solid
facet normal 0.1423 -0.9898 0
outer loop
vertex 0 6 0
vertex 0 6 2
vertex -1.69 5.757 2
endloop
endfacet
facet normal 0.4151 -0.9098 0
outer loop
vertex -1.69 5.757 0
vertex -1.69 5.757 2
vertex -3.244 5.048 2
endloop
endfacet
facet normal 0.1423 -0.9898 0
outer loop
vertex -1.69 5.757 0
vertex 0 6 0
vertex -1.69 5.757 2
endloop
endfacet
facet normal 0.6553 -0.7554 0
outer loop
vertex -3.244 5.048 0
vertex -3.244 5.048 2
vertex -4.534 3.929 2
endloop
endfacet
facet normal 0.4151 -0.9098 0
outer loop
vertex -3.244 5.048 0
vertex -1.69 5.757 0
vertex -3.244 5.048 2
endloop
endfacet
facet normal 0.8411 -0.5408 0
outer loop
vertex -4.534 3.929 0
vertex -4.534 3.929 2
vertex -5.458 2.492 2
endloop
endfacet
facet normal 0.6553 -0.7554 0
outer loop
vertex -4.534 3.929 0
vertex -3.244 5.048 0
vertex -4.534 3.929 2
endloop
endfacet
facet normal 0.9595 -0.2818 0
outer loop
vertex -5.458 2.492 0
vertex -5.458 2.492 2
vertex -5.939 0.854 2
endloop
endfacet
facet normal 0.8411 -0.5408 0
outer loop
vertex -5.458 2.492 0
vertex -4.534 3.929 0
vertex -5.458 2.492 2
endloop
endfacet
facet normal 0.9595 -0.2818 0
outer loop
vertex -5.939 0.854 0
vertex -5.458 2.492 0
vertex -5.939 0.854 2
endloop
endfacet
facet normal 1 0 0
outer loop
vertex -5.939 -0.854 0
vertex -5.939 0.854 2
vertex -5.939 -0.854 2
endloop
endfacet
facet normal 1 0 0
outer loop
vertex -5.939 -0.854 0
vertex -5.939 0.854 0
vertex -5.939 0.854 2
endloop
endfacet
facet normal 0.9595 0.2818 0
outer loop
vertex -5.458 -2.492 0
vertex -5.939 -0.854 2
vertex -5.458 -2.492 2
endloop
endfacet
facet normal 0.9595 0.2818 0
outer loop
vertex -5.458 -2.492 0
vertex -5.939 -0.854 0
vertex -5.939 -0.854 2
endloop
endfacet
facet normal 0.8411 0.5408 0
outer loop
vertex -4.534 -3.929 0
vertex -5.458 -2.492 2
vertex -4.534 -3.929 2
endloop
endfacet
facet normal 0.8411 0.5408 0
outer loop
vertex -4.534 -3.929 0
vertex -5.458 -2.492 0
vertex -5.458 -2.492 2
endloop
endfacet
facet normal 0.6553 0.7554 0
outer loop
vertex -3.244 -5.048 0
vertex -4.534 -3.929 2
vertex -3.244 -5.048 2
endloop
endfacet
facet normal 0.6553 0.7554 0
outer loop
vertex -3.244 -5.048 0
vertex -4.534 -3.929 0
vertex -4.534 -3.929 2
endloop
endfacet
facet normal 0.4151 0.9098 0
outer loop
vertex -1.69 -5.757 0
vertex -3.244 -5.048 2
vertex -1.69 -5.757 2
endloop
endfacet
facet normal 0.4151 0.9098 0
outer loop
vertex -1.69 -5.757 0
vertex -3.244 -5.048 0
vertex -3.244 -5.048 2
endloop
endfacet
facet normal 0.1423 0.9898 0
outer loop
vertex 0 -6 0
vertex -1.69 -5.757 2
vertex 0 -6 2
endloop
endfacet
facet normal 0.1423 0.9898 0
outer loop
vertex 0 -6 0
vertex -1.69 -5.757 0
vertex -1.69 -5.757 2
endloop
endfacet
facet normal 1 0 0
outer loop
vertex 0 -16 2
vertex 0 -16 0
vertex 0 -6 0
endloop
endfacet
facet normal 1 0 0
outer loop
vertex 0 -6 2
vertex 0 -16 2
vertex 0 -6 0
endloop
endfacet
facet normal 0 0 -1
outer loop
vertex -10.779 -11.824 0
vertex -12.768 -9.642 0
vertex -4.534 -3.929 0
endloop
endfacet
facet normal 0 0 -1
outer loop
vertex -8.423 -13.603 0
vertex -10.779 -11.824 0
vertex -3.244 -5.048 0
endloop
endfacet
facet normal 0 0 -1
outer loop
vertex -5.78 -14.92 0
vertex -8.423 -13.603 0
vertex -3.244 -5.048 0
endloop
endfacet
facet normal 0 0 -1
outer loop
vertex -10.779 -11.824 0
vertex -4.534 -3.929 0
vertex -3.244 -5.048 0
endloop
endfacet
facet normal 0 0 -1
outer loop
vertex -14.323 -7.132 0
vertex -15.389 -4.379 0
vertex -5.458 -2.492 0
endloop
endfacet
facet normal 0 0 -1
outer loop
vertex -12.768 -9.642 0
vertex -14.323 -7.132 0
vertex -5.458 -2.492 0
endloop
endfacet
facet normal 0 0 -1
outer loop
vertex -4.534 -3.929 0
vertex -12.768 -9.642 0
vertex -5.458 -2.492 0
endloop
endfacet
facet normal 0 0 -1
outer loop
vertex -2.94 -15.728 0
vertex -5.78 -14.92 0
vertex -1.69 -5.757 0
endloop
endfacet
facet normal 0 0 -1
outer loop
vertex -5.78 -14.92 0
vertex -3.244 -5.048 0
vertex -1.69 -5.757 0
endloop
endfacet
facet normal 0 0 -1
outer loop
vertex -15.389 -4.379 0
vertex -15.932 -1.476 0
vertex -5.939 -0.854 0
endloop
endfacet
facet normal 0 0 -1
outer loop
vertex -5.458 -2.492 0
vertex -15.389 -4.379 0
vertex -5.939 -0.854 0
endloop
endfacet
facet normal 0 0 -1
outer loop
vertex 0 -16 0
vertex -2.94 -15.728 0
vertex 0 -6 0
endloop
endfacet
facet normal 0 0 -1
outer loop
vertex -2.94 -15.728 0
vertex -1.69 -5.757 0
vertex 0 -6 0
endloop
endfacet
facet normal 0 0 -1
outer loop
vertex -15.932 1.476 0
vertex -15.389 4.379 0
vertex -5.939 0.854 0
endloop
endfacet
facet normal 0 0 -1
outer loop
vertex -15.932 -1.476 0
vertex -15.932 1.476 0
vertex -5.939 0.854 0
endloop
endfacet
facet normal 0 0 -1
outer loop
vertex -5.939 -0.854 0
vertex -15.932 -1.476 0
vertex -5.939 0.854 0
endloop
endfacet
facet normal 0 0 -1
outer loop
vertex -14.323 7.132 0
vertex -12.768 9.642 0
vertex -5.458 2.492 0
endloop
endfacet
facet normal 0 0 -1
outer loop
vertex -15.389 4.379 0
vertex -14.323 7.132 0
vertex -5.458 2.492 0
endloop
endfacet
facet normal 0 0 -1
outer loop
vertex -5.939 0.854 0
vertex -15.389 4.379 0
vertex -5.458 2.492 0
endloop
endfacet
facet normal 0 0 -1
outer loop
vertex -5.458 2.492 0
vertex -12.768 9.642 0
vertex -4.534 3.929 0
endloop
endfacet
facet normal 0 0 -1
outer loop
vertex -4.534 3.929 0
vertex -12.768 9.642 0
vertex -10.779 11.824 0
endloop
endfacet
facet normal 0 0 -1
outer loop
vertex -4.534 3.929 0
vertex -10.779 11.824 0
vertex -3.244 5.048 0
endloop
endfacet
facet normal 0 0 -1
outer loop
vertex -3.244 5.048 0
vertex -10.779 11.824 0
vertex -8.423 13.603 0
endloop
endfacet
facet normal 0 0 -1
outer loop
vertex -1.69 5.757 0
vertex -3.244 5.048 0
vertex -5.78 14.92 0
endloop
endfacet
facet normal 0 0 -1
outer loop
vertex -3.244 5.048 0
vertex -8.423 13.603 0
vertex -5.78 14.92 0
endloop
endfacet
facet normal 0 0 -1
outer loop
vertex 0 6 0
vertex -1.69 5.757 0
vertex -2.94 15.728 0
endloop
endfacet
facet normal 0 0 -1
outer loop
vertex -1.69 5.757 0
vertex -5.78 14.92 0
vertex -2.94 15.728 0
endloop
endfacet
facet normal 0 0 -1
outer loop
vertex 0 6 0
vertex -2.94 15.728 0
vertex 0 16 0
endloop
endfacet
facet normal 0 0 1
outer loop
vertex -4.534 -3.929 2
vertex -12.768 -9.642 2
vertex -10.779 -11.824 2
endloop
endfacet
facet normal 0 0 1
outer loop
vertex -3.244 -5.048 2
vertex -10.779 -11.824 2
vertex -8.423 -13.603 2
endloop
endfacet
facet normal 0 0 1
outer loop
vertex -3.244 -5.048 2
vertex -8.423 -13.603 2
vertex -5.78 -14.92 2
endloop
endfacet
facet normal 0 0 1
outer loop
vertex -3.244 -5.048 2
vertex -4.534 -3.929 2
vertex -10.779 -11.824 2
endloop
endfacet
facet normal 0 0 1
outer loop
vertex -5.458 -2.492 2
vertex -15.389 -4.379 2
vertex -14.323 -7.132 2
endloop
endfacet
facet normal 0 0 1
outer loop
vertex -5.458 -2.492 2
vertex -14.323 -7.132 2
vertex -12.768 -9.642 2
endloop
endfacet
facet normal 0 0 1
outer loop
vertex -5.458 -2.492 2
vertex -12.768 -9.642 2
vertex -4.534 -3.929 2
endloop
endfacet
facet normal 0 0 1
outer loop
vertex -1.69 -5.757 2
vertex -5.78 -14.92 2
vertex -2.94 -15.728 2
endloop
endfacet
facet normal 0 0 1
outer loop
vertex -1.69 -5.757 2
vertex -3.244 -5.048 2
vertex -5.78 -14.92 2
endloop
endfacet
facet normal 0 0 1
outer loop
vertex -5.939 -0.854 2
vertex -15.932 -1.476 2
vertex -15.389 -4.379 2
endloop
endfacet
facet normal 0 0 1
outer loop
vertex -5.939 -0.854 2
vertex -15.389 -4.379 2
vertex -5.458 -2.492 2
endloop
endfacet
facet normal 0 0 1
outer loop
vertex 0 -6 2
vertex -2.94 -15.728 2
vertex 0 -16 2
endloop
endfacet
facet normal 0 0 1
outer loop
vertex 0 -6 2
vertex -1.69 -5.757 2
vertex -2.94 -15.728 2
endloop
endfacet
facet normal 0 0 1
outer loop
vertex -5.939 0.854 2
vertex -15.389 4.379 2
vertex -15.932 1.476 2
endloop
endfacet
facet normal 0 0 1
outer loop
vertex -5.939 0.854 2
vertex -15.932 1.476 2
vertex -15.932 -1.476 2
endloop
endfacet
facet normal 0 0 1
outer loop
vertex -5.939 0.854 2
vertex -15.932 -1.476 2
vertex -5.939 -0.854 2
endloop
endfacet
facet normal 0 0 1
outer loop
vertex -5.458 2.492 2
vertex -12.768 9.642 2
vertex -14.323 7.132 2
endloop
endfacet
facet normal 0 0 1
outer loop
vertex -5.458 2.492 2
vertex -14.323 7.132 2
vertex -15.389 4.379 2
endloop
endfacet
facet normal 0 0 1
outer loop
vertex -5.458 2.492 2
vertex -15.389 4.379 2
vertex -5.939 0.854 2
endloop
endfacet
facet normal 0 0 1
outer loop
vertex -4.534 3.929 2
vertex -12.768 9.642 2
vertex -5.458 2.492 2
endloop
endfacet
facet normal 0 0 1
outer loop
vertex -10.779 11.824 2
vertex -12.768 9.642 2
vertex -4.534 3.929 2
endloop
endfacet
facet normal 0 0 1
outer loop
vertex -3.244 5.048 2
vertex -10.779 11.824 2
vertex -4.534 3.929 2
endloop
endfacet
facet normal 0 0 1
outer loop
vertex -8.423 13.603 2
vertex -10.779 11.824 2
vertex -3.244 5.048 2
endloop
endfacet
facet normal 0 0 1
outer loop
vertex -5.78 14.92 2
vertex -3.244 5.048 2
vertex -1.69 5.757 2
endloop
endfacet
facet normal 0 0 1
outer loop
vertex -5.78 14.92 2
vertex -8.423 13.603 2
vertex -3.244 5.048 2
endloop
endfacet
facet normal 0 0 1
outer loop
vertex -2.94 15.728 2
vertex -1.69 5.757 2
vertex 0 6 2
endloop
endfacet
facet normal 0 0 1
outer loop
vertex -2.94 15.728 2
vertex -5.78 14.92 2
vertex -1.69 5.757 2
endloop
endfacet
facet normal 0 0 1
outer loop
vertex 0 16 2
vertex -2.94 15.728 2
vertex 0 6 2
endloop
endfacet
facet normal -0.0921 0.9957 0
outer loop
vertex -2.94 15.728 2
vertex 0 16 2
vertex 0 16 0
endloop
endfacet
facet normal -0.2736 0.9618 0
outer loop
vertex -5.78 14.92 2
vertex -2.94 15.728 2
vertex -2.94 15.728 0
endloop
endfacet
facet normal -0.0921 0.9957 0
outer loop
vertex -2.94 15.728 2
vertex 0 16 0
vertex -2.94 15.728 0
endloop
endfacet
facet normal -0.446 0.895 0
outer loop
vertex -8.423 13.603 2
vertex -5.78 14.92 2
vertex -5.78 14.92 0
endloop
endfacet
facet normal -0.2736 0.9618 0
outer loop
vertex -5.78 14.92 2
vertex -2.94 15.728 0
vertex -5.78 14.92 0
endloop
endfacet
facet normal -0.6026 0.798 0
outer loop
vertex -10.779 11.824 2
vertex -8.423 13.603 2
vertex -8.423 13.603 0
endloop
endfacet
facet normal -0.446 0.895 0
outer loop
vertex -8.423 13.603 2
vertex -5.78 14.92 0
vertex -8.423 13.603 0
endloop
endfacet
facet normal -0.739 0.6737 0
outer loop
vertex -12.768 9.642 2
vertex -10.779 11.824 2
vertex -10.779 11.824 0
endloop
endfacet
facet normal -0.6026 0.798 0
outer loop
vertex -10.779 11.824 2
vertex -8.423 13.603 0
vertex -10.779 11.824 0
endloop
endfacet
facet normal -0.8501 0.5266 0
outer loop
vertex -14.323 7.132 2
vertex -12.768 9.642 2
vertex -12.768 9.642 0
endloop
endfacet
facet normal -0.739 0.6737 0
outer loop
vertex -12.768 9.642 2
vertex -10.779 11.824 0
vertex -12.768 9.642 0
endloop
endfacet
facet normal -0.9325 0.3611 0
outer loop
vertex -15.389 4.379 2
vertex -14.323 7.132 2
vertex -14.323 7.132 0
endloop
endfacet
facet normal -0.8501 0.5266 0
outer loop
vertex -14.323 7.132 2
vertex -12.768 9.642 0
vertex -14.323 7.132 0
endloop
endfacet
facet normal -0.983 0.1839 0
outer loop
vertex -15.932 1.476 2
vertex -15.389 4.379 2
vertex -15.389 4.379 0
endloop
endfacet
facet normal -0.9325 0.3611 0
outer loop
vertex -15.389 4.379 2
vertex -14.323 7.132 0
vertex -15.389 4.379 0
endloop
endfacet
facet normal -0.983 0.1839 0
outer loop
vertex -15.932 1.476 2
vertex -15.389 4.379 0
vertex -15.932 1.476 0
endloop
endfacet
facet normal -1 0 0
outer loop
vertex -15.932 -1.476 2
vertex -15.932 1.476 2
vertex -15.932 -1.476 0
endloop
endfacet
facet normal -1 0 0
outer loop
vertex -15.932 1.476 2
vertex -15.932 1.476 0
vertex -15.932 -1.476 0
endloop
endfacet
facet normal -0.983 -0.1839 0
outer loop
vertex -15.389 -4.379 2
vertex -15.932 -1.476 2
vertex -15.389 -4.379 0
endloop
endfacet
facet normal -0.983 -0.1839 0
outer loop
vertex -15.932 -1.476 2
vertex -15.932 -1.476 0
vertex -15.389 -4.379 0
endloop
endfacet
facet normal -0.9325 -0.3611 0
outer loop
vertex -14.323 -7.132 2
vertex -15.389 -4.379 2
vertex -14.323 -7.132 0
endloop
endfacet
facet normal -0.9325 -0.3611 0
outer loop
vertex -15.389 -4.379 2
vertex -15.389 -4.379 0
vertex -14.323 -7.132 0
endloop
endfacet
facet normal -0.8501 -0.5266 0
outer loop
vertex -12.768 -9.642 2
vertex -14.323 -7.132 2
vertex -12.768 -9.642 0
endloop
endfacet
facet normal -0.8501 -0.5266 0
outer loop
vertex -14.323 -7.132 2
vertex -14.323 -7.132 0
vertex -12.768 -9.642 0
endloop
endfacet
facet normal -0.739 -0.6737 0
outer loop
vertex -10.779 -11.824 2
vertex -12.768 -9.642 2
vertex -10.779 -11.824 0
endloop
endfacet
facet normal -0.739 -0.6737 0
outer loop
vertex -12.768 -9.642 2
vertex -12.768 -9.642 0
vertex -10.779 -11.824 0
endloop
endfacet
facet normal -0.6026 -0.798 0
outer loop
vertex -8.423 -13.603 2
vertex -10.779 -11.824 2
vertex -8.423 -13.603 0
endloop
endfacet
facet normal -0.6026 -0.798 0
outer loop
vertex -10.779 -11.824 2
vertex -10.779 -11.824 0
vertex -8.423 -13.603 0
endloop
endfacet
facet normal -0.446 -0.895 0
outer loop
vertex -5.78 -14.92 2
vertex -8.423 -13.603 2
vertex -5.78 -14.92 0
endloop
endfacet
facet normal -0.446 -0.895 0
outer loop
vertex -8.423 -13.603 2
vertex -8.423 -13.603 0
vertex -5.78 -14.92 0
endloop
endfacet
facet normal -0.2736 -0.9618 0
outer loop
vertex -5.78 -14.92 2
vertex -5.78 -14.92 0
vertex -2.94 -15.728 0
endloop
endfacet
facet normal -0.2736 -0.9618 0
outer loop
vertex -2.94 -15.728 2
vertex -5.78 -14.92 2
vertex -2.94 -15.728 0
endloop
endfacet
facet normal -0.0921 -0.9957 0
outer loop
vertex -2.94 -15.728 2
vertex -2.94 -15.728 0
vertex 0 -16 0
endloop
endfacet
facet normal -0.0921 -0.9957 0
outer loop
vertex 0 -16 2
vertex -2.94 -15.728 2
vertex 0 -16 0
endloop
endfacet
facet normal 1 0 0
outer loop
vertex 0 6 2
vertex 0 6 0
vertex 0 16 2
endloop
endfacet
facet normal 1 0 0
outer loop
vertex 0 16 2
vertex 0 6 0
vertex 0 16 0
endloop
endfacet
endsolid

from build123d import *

# Parameters (mm, degrees)
F0_R     = 16
F1_DEPTH = 2
F2_R     = 6
F3_DEPTH = 25
F4_W     = 41.035842
F4_H     = 41.410806
F5_DEPTH = 25


with BuildPart() as f1:
    # F0 (on Top) → F1 (new body)
    with BuildSketch(Plane.XY):
        Circle(F0_R)
    extrude(amount=F1_DEPTH)

    # F2 (on Top) → F3 (cut)
    with BuildSketch(Plane.XY):
        Circle(F2_R)
    extrude(amount=F3_DEPTH, mode=Mode.SUBTRACT)

    # F4 (on Top) → F5 (cut)
    with BuildSketch(Plane.XY):
        with Locations((20.517921, 0.114485)):
            Rectangle(F4_W, F4_H)
    extrude(amount=F5_DEPTH, mode=Mode.SUBTRACT)


solid = f1.part
